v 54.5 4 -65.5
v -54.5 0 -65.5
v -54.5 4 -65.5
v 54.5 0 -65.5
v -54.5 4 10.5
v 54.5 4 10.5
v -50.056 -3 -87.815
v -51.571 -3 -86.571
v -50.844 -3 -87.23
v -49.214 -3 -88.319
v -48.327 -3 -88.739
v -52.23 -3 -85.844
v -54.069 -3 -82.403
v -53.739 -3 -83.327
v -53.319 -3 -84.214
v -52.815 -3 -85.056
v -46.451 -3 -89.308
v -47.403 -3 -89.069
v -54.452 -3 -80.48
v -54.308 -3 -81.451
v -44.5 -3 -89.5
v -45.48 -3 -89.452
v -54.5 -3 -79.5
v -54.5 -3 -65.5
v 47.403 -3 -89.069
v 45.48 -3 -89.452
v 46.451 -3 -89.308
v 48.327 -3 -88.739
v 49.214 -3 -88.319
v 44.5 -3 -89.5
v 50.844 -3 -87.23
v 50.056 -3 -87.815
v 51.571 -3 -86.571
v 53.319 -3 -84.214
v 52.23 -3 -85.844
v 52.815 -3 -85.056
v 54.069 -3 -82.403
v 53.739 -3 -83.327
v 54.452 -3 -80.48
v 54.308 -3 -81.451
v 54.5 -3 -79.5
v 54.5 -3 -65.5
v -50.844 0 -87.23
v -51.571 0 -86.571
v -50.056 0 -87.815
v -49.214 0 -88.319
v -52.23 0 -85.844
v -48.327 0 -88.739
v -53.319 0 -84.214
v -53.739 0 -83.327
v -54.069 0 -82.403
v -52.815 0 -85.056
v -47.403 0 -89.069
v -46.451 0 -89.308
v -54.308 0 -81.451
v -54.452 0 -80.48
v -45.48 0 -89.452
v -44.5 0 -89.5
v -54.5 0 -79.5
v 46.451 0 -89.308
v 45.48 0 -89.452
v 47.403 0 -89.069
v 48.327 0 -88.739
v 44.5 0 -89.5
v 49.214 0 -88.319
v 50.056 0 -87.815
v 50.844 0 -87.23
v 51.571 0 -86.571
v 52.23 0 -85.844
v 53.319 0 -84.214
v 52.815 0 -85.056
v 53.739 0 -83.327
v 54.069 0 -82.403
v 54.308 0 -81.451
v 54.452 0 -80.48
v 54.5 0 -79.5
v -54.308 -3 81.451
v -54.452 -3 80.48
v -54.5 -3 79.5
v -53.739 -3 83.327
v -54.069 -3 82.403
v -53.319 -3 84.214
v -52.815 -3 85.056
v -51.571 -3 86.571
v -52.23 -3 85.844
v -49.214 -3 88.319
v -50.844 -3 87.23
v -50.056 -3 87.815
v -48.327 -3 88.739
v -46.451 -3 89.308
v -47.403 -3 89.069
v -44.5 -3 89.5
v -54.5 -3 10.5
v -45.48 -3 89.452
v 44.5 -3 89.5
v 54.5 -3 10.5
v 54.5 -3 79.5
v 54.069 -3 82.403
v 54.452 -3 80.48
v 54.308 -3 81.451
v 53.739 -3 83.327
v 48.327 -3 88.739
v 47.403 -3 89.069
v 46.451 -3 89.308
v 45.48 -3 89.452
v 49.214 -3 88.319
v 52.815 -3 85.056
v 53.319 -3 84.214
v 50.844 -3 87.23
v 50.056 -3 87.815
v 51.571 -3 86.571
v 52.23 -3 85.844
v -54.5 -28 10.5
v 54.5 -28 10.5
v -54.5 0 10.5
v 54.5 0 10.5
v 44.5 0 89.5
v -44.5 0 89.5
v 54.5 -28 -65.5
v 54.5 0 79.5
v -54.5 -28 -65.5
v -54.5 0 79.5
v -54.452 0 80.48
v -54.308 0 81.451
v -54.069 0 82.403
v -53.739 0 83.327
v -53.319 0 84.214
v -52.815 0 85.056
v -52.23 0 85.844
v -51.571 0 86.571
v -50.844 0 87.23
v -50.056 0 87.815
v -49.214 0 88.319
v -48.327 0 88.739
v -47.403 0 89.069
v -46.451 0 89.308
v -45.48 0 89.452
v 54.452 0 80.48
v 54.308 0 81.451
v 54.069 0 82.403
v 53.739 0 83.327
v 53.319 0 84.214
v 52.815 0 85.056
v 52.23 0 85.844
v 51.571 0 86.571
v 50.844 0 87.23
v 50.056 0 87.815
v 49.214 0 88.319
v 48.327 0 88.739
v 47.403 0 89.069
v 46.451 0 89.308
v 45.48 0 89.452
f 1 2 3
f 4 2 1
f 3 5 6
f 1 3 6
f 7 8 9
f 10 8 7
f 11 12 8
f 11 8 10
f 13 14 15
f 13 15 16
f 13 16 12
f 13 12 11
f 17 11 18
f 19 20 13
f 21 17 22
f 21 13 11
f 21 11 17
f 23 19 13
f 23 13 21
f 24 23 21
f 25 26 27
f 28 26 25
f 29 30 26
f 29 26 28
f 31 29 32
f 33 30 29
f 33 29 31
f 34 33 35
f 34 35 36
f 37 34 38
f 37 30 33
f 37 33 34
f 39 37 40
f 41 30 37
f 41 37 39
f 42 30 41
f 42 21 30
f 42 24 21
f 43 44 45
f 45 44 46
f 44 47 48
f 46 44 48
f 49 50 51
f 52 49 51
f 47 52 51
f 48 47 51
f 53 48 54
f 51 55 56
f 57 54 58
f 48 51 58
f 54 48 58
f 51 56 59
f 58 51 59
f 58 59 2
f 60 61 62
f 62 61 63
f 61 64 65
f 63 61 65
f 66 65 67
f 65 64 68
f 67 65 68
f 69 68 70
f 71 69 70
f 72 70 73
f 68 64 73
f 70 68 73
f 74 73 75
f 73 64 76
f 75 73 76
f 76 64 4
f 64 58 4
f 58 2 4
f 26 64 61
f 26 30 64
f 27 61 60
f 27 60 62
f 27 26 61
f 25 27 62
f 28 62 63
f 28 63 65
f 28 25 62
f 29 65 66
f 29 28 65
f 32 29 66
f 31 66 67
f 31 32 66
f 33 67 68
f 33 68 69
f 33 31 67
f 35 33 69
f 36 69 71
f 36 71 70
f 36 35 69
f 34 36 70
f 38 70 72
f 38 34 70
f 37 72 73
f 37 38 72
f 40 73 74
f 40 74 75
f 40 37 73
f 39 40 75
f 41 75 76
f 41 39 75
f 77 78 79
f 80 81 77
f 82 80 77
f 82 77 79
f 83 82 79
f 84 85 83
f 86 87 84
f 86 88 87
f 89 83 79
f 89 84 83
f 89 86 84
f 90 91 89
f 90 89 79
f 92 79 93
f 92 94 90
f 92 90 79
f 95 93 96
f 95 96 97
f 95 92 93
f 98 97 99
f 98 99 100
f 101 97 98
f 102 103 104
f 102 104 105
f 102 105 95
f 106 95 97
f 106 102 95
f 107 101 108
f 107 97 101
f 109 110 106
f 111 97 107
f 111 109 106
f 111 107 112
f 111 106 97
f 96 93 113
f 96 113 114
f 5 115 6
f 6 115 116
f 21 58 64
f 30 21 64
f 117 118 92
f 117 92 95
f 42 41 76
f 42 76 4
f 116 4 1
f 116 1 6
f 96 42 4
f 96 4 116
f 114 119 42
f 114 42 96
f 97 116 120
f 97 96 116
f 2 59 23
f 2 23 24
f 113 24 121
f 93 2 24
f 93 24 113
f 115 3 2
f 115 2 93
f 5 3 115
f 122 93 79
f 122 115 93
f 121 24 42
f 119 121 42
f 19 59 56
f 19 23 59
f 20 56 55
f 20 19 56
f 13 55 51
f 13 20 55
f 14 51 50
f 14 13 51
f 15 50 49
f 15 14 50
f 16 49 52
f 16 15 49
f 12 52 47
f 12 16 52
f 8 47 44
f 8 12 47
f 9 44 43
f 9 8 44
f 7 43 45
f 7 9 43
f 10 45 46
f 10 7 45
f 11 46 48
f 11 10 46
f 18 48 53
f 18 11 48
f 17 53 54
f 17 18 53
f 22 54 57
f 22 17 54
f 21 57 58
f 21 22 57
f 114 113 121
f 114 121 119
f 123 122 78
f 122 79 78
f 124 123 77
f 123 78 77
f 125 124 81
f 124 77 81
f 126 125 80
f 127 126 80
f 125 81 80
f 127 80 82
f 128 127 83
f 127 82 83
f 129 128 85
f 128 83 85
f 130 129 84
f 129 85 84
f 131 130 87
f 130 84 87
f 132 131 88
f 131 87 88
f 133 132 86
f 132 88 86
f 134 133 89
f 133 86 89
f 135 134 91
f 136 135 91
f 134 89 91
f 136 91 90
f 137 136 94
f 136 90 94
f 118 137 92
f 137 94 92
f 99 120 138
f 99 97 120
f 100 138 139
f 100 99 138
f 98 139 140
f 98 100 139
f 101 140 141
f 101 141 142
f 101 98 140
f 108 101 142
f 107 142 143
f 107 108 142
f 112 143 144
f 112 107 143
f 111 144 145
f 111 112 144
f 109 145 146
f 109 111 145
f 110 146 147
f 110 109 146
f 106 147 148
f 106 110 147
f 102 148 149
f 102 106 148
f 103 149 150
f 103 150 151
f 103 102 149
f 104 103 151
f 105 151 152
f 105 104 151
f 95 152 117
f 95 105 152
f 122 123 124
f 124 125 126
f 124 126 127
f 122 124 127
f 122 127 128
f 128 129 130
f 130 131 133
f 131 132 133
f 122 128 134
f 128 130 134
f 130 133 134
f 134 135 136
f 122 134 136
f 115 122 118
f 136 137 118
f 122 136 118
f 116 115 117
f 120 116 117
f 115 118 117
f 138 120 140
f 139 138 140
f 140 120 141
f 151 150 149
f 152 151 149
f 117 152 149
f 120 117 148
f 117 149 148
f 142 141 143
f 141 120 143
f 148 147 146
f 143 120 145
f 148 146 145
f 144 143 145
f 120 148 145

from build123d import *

# Parameters (mm, degrees)
F0_W          = 109
F0_H          = 179
F1_DEPTH      = 3
F2_R          = 10
F3_W          = 109
F3_H          = 76
F4_DEPTH      = 25
F4_DEPTH_BACK = 7


with BuildPart() as f1:
    # F0 (on Front) → F1 (new body)
    with BuildSketch(Plane.XZ):
        Rectangle(F0_W, F0_H)
    extrude(amount=F1_DEPTH)

    # F2
    f2_edges = [f1.edges().sort_by_distance(p)[0] for p in [
        (54.5, -1.5, 89.5),
        (-54.5, -1.5, 89.5),
        (54.5, -1.5, -89.5),
        (-54.5, -1.5, -89.5),
    ]]
    fillet(f2_edges, radius=F2_R)

    # F3 (on face) → F4 (join, two sides)
    with BuildSketch(Plane.XZ.offset(3)) as f4_sk:
        with Locations((0, -27.5)):
            Rectangle(F3_W, F3_H)
    extrude(amount=F4_DEPTH)
    extrude(f4_sk.sketch, amount=-F4_DEPTH_BACK)


solid = f1.part
